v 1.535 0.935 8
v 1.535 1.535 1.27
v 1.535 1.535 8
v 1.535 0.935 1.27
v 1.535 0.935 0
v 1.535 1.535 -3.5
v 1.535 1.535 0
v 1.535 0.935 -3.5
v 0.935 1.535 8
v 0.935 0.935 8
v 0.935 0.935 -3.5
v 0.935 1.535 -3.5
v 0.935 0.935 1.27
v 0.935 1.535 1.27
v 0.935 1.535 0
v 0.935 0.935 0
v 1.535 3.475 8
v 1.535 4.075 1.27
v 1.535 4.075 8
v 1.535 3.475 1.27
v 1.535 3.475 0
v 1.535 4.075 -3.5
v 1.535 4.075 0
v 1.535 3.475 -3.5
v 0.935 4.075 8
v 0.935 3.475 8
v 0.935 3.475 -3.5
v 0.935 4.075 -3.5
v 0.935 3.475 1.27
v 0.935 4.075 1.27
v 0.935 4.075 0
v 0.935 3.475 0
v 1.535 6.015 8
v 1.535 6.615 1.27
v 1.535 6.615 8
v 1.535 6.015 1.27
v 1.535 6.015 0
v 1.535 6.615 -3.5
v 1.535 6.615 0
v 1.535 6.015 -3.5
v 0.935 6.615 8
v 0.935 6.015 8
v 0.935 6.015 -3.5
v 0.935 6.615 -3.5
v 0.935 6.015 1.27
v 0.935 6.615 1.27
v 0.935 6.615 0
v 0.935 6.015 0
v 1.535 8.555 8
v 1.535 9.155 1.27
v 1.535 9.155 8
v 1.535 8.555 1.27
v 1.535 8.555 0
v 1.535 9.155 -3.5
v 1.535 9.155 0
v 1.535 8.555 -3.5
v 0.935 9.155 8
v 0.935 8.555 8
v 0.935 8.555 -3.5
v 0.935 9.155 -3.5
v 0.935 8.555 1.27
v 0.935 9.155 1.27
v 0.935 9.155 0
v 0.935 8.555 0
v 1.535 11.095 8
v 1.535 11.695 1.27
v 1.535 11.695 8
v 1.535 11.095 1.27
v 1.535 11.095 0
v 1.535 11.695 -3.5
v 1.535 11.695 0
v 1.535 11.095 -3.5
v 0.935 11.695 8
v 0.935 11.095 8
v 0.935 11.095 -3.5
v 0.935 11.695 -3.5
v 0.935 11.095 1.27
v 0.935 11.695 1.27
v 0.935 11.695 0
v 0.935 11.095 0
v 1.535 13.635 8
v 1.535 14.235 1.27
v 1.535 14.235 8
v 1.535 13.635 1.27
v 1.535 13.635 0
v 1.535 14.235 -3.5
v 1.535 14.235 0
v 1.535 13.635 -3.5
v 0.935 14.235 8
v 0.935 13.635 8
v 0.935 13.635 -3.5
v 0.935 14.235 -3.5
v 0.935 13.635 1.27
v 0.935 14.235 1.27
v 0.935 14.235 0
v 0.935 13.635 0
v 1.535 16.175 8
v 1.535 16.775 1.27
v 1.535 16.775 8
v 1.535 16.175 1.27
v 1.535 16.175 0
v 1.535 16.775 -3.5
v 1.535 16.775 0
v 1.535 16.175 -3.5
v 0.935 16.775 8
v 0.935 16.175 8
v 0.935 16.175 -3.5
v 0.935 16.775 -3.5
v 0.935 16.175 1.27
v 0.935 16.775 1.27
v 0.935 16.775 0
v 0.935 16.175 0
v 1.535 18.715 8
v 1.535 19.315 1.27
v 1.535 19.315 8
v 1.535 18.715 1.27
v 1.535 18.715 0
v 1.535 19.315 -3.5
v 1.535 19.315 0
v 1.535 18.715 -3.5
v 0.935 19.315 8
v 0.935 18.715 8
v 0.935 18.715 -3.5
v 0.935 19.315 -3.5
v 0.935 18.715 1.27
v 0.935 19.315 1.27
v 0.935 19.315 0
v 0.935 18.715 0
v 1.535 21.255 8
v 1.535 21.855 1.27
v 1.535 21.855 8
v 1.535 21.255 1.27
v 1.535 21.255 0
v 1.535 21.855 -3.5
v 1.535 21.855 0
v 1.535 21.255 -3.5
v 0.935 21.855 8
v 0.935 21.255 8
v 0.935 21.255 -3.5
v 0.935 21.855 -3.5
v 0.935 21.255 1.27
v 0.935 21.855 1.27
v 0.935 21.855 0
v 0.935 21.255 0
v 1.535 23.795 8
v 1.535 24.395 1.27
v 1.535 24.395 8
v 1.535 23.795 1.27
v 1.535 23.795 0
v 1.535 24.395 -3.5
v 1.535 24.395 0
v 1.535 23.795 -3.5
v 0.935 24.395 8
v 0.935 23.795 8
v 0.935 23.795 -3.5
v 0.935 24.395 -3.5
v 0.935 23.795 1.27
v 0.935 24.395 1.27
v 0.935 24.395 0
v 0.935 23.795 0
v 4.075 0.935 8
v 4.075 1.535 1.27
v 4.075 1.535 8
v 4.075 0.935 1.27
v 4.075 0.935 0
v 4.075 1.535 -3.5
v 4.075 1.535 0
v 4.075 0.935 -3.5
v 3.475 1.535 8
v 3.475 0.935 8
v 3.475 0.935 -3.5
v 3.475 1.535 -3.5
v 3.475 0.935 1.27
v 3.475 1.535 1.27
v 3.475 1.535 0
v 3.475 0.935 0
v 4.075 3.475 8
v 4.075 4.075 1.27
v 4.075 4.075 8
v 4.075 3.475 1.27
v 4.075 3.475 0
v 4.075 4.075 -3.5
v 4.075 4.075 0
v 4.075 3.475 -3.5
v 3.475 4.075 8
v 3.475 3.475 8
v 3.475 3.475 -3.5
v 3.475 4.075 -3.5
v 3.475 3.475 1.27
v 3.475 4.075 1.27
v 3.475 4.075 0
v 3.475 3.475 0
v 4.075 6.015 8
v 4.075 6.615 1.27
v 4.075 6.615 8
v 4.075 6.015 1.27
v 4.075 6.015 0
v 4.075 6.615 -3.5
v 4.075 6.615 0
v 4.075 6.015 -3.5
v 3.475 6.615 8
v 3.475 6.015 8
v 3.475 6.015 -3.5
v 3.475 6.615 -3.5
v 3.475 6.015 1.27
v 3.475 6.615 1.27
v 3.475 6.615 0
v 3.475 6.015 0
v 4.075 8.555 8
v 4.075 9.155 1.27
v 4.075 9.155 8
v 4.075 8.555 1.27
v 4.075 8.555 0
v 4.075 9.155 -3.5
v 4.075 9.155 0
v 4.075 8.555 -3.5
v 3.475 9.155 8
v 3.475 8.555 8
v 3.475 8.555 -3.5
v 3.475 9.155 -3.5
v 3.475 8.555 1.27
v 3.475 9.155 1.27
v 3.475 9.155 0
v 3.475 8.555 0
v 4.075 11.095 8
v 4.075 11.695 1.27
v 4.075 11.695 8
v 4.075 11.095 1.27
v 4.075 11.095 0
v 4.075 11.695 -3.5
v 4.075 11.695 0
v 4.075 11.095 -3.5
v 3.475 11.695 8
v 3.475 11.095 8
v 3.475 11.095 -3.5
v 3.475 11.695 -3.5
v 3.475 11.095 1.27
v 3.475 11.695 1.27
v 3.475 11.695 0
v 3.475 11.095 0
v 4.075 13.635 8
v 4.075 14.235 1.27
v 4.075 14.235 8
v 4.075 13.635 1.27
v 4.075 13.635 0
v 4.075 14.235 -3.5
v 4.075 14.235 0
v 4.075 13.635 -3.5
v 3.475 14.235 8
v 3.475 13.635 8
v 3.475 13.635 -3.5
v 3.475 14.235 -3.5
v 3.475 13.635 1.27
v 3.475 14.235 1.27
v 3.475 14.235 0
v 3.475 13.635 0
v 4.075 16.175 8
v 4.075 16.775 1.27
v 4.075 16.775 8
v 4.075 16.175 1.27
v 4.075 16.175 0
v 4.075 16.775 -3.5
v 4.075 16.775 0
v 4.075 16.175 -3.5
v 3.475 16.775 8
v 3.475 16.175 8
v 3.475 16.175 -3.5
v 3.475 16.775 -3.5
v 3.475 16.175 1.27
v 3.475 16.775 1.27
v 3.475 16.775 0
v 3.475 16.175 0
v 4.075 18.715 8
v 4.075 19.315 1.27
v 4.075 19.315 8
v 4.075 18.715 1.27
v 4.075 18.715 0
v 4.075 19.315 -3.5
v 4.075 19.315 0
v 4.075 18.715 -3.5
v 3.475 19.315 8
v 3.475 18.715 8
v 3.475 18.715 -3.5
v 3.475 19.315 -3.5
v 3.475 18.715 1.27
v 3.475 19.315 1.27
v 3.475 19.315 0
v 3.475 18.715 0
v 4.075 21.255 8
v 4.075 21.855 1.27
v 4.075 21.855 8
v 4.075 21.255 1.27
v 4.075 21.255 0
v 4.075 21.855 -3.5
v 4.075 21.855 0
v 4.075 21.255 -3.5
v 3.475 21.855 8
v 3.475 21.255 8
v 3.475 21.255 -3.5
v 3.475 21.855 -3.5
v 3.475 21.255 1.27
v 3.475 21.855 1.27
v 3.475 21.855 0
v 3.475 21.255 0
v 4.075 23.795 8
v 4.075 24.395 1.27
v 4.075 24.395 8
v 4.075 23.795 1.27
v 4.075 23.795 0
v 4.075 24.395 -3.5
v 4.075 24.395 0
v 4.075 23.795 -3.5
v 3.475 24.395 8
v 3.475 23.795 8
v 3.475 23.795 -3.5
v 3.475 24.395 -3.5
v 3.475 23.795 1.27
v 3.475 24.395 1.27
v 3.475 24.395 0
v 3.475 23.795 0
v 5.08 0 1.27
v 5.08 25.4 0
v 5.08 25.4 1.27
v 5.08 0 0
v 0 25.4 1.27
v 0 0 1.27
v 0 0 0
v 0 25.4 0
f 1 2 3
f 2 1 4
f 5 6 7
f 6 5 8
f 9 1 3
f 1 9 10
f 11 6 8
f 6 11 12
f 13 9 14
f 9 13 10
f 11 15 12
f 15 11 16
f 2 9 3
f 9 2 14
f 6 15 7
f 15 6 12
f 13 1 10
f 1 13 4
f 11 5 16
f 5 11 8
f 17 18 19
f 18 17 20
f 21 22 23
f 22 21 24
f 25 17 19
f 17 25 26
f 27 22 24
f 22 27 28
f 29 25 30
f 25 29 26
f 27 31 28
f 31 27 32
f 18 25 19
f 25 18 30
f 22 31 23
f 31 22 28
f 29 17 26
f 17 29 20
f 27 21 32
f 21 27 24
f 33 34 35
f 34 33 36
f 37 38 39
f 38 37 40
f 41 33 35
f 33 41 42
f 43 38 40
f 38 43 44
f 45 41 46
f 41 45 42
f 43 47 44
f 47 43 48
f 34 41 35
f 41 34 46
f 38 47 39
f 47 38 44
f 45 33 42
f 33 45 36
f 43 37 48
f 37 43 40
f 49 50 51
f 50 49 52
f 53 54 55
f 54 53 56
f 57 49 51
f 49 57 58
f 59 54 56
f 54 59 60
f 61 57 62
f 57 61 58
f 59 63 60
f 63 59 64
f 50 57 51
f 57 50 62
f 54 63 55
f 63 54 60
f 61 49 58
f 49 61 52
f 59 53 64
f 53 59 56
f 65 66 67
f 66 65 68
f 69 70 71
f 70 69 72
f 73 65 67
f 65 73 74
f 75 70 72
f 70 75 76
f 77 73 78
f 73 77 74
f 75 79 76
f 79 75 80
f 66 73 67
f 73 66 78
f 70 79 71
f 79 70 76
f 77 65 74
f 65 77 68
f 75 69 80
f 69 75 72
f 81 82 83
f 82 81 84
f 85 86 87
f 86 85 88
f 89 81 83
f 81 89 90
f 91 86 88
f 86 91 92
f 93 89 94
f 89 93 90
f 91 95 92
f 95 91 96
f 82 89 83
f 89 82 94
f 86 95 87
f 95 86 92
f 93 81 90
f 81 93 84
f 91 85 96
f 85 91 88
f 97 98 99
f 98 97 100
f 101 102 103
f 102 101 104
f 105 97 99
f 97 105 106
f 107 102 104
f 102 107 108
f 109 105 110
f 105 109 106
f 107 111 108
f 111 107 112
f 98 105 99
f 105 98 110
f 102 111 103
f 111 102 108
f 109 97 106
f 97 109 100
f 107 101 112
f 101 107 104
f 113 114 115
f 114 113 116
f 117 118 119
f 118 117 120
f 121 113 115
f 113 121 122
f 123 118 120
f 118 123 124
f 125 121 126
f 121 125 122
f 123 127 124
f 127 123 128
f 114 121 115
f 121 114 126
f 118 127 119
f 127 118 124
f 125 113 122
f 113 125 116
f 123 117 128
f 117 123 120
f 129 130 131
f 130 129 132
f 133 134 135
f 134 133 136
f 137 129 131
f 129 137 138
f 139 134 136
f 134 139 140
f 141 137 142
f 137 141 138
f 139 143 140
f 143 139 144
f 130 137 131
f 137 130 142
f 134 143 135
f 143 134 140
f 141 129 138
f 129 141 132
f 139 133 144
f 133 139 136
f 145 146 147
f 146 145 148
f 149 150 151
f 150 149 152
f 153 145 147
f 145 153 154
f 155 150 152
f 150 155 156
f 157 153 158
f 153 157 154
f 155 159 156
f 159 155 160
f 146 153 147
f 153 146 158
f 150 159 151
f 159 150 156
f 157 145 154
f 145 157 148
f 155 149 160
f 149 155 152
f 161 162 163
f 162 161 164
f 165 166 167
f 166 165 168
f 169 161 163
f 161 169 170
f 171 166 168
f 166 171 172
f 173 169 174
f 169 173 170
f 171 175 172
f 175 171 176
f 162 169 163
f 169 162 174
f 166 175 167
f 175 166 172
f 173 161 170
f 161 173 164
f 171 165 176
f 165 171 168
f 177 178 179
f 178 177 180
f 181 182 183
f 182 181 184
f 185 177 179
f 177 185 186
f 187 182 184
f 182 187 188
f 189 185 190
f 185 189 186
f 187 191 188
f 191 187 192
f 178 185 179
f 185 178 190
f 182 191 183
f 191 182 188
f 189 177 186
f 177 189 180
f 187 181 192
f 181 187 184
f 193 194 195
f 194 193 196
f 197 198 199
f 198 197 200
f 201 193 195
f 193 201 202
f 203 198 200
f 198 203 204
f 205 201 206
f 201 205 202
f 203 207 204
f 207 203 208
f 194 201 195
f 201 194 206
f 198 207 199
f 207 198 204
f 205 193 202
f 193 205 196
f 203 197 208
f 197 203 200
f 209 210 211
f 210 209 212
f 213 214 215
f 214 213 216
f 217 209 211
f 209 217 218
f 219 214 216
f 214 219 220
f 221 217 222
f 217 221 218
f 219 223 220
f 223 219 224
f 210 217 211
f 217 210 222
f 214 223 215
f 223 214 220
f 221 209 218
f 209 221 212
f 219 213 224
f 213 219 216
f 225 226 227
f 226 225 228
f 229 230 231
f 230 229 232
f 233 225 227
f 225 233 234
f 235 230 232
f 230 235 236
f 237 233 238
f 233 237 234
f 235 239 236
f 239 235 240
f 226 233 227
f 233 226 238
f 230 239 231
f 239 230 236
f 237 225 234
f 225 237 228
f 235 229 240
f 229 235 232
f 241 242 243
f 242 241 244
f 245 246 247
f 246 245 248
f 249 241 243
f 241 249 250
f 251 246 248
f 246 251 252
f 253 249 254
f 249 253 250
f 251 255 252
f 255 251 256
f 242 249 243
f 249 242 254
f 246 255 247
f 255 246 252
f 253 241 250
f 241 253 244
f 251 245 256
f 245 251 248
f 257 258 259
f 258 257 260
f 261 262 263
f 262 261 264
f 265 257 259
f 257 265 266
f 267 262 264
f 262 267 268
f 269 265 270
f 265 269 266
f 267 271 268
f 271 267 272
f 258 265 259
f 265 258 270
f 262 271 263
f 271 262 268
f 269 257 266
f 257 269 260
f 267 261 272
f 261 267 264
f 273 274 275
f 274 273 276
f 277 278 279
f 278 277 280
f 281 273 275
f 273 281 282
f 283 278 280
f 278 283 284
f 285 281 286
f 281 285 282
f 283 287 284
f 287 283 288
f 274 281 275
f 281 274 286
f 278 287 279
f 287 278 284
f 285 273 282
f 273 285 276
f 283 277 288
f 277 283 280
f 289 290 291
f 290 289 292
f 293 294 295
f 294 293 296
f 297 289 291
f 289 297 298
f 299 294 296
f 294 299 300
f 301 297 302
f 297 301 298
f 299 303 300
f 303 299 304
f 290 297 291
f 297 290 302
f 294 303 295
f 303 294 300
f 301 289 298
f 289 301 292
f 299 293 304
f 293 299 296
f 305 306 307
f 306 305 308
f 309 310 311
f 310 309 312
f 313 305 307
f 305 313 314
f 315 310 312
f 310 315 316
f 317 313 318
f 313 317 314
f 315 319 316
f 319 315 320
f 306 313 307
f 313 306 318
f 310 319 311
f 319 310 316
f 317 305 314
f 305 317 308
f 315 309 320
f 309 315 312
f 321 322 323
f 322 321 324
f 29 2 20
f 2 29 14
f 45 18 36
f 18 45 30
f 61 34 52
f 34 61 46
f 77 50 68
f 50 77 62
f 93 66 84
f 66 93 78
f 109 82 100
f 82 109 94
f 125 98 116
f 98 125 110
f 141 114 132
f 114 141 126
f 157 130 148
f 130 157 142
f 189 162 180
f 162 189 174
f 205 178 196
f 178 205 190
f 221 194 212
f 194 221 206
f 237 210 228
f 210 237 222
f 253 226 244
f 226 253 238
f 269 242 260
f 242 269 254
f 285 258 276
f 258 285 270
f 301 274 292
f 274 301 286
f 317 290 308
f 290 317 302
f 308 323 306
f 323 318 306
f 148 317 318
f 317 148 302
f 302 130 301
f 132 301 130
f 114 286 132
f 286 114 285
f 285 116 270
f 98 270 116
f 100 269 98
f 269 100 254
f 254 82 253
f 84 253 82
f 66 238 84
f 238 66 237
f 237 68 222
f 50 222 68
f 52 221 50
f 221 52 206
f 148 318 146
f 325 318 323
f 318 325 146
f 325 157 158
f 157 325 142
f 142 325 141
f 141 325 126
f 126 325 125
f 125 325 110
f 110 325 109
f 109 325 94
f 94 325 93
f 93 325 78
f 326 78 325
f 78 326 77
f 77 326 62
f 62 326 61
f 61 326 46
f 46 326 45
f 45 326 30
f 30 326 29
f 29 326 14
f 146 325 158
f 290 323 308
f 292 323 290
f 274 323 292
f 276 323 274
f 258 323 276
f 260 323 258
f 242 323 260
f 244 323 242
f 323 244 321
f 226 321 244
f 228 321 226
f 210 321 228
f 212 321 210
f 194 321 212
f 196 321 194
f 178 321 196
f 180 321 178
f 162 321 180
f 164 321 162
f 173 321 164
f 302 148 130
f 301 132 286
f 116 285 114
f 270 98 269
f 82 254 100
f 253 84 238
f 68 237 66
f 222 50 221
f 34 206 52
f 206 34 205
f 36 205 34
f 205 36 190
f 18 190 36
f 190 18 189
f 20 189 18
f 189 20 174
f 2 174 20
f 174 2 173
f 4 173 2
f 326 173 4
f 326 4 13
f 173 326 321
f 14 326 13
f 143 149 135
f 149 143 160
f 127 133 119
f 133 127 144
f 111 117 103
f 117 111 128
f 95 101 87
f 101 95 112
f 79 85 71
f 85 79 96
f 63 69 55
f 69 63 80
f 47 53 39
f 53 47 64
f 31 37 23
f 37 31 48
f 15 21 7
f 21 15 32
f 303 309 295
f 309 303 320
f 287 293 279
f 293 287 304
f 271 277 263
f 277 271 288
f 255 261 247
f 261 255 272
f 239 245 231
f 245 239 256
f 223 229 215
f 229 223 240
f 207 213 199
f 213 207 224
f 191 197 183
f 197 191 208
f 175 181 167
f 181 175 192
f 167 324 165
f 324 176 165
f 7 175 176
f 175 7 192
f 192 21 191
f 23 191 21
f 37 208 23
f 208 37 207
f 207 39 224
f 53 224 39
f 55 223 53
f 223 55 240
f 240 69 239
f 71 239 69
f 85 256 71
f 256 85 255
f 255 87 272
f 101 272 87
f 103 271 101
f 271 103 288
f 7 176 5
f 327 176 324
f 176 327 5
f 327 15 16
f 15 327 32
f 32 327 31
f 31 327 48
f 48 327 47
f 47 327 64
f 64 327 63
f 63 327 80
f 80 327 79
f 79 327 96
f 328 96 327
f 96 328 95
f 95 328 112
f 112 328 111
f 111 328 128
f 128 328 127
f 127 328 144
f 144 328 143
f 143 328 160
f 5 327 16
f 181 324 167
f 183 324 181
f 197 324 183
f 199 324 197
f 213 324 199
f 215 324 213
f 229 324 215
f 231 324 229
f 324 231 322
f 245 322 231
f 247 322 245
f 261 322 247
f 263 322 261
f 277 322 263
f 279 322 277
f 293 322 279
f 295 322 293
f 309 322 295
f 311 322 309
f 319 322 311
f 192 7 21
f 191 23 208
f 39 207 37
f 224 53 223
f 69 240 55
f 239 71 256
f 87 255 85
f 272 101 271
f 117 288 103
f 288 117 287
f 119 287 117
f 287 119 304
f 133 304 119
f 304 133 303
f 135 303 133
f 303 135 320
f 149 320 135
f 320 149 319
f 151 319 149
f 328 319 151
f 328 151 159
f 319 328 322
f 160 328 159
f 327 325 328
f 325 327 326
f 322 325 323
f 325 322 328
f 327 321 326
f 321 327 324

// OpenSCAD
pinHeader(2,10,2.54);
//pinHeader(2,10,2);

module pinHeader(pins, rows, step)
{
    color("darkgrey") cube([step*pins,step*rows,step/2]);
  
    for(x=[0:pins-1],y=[0:rows-1])
        translate([x*step+(step/2+.6)/2,y*step+(step/2+.6)/2,-3.5])
          cube([0.6,0.6,11.5]);
}
